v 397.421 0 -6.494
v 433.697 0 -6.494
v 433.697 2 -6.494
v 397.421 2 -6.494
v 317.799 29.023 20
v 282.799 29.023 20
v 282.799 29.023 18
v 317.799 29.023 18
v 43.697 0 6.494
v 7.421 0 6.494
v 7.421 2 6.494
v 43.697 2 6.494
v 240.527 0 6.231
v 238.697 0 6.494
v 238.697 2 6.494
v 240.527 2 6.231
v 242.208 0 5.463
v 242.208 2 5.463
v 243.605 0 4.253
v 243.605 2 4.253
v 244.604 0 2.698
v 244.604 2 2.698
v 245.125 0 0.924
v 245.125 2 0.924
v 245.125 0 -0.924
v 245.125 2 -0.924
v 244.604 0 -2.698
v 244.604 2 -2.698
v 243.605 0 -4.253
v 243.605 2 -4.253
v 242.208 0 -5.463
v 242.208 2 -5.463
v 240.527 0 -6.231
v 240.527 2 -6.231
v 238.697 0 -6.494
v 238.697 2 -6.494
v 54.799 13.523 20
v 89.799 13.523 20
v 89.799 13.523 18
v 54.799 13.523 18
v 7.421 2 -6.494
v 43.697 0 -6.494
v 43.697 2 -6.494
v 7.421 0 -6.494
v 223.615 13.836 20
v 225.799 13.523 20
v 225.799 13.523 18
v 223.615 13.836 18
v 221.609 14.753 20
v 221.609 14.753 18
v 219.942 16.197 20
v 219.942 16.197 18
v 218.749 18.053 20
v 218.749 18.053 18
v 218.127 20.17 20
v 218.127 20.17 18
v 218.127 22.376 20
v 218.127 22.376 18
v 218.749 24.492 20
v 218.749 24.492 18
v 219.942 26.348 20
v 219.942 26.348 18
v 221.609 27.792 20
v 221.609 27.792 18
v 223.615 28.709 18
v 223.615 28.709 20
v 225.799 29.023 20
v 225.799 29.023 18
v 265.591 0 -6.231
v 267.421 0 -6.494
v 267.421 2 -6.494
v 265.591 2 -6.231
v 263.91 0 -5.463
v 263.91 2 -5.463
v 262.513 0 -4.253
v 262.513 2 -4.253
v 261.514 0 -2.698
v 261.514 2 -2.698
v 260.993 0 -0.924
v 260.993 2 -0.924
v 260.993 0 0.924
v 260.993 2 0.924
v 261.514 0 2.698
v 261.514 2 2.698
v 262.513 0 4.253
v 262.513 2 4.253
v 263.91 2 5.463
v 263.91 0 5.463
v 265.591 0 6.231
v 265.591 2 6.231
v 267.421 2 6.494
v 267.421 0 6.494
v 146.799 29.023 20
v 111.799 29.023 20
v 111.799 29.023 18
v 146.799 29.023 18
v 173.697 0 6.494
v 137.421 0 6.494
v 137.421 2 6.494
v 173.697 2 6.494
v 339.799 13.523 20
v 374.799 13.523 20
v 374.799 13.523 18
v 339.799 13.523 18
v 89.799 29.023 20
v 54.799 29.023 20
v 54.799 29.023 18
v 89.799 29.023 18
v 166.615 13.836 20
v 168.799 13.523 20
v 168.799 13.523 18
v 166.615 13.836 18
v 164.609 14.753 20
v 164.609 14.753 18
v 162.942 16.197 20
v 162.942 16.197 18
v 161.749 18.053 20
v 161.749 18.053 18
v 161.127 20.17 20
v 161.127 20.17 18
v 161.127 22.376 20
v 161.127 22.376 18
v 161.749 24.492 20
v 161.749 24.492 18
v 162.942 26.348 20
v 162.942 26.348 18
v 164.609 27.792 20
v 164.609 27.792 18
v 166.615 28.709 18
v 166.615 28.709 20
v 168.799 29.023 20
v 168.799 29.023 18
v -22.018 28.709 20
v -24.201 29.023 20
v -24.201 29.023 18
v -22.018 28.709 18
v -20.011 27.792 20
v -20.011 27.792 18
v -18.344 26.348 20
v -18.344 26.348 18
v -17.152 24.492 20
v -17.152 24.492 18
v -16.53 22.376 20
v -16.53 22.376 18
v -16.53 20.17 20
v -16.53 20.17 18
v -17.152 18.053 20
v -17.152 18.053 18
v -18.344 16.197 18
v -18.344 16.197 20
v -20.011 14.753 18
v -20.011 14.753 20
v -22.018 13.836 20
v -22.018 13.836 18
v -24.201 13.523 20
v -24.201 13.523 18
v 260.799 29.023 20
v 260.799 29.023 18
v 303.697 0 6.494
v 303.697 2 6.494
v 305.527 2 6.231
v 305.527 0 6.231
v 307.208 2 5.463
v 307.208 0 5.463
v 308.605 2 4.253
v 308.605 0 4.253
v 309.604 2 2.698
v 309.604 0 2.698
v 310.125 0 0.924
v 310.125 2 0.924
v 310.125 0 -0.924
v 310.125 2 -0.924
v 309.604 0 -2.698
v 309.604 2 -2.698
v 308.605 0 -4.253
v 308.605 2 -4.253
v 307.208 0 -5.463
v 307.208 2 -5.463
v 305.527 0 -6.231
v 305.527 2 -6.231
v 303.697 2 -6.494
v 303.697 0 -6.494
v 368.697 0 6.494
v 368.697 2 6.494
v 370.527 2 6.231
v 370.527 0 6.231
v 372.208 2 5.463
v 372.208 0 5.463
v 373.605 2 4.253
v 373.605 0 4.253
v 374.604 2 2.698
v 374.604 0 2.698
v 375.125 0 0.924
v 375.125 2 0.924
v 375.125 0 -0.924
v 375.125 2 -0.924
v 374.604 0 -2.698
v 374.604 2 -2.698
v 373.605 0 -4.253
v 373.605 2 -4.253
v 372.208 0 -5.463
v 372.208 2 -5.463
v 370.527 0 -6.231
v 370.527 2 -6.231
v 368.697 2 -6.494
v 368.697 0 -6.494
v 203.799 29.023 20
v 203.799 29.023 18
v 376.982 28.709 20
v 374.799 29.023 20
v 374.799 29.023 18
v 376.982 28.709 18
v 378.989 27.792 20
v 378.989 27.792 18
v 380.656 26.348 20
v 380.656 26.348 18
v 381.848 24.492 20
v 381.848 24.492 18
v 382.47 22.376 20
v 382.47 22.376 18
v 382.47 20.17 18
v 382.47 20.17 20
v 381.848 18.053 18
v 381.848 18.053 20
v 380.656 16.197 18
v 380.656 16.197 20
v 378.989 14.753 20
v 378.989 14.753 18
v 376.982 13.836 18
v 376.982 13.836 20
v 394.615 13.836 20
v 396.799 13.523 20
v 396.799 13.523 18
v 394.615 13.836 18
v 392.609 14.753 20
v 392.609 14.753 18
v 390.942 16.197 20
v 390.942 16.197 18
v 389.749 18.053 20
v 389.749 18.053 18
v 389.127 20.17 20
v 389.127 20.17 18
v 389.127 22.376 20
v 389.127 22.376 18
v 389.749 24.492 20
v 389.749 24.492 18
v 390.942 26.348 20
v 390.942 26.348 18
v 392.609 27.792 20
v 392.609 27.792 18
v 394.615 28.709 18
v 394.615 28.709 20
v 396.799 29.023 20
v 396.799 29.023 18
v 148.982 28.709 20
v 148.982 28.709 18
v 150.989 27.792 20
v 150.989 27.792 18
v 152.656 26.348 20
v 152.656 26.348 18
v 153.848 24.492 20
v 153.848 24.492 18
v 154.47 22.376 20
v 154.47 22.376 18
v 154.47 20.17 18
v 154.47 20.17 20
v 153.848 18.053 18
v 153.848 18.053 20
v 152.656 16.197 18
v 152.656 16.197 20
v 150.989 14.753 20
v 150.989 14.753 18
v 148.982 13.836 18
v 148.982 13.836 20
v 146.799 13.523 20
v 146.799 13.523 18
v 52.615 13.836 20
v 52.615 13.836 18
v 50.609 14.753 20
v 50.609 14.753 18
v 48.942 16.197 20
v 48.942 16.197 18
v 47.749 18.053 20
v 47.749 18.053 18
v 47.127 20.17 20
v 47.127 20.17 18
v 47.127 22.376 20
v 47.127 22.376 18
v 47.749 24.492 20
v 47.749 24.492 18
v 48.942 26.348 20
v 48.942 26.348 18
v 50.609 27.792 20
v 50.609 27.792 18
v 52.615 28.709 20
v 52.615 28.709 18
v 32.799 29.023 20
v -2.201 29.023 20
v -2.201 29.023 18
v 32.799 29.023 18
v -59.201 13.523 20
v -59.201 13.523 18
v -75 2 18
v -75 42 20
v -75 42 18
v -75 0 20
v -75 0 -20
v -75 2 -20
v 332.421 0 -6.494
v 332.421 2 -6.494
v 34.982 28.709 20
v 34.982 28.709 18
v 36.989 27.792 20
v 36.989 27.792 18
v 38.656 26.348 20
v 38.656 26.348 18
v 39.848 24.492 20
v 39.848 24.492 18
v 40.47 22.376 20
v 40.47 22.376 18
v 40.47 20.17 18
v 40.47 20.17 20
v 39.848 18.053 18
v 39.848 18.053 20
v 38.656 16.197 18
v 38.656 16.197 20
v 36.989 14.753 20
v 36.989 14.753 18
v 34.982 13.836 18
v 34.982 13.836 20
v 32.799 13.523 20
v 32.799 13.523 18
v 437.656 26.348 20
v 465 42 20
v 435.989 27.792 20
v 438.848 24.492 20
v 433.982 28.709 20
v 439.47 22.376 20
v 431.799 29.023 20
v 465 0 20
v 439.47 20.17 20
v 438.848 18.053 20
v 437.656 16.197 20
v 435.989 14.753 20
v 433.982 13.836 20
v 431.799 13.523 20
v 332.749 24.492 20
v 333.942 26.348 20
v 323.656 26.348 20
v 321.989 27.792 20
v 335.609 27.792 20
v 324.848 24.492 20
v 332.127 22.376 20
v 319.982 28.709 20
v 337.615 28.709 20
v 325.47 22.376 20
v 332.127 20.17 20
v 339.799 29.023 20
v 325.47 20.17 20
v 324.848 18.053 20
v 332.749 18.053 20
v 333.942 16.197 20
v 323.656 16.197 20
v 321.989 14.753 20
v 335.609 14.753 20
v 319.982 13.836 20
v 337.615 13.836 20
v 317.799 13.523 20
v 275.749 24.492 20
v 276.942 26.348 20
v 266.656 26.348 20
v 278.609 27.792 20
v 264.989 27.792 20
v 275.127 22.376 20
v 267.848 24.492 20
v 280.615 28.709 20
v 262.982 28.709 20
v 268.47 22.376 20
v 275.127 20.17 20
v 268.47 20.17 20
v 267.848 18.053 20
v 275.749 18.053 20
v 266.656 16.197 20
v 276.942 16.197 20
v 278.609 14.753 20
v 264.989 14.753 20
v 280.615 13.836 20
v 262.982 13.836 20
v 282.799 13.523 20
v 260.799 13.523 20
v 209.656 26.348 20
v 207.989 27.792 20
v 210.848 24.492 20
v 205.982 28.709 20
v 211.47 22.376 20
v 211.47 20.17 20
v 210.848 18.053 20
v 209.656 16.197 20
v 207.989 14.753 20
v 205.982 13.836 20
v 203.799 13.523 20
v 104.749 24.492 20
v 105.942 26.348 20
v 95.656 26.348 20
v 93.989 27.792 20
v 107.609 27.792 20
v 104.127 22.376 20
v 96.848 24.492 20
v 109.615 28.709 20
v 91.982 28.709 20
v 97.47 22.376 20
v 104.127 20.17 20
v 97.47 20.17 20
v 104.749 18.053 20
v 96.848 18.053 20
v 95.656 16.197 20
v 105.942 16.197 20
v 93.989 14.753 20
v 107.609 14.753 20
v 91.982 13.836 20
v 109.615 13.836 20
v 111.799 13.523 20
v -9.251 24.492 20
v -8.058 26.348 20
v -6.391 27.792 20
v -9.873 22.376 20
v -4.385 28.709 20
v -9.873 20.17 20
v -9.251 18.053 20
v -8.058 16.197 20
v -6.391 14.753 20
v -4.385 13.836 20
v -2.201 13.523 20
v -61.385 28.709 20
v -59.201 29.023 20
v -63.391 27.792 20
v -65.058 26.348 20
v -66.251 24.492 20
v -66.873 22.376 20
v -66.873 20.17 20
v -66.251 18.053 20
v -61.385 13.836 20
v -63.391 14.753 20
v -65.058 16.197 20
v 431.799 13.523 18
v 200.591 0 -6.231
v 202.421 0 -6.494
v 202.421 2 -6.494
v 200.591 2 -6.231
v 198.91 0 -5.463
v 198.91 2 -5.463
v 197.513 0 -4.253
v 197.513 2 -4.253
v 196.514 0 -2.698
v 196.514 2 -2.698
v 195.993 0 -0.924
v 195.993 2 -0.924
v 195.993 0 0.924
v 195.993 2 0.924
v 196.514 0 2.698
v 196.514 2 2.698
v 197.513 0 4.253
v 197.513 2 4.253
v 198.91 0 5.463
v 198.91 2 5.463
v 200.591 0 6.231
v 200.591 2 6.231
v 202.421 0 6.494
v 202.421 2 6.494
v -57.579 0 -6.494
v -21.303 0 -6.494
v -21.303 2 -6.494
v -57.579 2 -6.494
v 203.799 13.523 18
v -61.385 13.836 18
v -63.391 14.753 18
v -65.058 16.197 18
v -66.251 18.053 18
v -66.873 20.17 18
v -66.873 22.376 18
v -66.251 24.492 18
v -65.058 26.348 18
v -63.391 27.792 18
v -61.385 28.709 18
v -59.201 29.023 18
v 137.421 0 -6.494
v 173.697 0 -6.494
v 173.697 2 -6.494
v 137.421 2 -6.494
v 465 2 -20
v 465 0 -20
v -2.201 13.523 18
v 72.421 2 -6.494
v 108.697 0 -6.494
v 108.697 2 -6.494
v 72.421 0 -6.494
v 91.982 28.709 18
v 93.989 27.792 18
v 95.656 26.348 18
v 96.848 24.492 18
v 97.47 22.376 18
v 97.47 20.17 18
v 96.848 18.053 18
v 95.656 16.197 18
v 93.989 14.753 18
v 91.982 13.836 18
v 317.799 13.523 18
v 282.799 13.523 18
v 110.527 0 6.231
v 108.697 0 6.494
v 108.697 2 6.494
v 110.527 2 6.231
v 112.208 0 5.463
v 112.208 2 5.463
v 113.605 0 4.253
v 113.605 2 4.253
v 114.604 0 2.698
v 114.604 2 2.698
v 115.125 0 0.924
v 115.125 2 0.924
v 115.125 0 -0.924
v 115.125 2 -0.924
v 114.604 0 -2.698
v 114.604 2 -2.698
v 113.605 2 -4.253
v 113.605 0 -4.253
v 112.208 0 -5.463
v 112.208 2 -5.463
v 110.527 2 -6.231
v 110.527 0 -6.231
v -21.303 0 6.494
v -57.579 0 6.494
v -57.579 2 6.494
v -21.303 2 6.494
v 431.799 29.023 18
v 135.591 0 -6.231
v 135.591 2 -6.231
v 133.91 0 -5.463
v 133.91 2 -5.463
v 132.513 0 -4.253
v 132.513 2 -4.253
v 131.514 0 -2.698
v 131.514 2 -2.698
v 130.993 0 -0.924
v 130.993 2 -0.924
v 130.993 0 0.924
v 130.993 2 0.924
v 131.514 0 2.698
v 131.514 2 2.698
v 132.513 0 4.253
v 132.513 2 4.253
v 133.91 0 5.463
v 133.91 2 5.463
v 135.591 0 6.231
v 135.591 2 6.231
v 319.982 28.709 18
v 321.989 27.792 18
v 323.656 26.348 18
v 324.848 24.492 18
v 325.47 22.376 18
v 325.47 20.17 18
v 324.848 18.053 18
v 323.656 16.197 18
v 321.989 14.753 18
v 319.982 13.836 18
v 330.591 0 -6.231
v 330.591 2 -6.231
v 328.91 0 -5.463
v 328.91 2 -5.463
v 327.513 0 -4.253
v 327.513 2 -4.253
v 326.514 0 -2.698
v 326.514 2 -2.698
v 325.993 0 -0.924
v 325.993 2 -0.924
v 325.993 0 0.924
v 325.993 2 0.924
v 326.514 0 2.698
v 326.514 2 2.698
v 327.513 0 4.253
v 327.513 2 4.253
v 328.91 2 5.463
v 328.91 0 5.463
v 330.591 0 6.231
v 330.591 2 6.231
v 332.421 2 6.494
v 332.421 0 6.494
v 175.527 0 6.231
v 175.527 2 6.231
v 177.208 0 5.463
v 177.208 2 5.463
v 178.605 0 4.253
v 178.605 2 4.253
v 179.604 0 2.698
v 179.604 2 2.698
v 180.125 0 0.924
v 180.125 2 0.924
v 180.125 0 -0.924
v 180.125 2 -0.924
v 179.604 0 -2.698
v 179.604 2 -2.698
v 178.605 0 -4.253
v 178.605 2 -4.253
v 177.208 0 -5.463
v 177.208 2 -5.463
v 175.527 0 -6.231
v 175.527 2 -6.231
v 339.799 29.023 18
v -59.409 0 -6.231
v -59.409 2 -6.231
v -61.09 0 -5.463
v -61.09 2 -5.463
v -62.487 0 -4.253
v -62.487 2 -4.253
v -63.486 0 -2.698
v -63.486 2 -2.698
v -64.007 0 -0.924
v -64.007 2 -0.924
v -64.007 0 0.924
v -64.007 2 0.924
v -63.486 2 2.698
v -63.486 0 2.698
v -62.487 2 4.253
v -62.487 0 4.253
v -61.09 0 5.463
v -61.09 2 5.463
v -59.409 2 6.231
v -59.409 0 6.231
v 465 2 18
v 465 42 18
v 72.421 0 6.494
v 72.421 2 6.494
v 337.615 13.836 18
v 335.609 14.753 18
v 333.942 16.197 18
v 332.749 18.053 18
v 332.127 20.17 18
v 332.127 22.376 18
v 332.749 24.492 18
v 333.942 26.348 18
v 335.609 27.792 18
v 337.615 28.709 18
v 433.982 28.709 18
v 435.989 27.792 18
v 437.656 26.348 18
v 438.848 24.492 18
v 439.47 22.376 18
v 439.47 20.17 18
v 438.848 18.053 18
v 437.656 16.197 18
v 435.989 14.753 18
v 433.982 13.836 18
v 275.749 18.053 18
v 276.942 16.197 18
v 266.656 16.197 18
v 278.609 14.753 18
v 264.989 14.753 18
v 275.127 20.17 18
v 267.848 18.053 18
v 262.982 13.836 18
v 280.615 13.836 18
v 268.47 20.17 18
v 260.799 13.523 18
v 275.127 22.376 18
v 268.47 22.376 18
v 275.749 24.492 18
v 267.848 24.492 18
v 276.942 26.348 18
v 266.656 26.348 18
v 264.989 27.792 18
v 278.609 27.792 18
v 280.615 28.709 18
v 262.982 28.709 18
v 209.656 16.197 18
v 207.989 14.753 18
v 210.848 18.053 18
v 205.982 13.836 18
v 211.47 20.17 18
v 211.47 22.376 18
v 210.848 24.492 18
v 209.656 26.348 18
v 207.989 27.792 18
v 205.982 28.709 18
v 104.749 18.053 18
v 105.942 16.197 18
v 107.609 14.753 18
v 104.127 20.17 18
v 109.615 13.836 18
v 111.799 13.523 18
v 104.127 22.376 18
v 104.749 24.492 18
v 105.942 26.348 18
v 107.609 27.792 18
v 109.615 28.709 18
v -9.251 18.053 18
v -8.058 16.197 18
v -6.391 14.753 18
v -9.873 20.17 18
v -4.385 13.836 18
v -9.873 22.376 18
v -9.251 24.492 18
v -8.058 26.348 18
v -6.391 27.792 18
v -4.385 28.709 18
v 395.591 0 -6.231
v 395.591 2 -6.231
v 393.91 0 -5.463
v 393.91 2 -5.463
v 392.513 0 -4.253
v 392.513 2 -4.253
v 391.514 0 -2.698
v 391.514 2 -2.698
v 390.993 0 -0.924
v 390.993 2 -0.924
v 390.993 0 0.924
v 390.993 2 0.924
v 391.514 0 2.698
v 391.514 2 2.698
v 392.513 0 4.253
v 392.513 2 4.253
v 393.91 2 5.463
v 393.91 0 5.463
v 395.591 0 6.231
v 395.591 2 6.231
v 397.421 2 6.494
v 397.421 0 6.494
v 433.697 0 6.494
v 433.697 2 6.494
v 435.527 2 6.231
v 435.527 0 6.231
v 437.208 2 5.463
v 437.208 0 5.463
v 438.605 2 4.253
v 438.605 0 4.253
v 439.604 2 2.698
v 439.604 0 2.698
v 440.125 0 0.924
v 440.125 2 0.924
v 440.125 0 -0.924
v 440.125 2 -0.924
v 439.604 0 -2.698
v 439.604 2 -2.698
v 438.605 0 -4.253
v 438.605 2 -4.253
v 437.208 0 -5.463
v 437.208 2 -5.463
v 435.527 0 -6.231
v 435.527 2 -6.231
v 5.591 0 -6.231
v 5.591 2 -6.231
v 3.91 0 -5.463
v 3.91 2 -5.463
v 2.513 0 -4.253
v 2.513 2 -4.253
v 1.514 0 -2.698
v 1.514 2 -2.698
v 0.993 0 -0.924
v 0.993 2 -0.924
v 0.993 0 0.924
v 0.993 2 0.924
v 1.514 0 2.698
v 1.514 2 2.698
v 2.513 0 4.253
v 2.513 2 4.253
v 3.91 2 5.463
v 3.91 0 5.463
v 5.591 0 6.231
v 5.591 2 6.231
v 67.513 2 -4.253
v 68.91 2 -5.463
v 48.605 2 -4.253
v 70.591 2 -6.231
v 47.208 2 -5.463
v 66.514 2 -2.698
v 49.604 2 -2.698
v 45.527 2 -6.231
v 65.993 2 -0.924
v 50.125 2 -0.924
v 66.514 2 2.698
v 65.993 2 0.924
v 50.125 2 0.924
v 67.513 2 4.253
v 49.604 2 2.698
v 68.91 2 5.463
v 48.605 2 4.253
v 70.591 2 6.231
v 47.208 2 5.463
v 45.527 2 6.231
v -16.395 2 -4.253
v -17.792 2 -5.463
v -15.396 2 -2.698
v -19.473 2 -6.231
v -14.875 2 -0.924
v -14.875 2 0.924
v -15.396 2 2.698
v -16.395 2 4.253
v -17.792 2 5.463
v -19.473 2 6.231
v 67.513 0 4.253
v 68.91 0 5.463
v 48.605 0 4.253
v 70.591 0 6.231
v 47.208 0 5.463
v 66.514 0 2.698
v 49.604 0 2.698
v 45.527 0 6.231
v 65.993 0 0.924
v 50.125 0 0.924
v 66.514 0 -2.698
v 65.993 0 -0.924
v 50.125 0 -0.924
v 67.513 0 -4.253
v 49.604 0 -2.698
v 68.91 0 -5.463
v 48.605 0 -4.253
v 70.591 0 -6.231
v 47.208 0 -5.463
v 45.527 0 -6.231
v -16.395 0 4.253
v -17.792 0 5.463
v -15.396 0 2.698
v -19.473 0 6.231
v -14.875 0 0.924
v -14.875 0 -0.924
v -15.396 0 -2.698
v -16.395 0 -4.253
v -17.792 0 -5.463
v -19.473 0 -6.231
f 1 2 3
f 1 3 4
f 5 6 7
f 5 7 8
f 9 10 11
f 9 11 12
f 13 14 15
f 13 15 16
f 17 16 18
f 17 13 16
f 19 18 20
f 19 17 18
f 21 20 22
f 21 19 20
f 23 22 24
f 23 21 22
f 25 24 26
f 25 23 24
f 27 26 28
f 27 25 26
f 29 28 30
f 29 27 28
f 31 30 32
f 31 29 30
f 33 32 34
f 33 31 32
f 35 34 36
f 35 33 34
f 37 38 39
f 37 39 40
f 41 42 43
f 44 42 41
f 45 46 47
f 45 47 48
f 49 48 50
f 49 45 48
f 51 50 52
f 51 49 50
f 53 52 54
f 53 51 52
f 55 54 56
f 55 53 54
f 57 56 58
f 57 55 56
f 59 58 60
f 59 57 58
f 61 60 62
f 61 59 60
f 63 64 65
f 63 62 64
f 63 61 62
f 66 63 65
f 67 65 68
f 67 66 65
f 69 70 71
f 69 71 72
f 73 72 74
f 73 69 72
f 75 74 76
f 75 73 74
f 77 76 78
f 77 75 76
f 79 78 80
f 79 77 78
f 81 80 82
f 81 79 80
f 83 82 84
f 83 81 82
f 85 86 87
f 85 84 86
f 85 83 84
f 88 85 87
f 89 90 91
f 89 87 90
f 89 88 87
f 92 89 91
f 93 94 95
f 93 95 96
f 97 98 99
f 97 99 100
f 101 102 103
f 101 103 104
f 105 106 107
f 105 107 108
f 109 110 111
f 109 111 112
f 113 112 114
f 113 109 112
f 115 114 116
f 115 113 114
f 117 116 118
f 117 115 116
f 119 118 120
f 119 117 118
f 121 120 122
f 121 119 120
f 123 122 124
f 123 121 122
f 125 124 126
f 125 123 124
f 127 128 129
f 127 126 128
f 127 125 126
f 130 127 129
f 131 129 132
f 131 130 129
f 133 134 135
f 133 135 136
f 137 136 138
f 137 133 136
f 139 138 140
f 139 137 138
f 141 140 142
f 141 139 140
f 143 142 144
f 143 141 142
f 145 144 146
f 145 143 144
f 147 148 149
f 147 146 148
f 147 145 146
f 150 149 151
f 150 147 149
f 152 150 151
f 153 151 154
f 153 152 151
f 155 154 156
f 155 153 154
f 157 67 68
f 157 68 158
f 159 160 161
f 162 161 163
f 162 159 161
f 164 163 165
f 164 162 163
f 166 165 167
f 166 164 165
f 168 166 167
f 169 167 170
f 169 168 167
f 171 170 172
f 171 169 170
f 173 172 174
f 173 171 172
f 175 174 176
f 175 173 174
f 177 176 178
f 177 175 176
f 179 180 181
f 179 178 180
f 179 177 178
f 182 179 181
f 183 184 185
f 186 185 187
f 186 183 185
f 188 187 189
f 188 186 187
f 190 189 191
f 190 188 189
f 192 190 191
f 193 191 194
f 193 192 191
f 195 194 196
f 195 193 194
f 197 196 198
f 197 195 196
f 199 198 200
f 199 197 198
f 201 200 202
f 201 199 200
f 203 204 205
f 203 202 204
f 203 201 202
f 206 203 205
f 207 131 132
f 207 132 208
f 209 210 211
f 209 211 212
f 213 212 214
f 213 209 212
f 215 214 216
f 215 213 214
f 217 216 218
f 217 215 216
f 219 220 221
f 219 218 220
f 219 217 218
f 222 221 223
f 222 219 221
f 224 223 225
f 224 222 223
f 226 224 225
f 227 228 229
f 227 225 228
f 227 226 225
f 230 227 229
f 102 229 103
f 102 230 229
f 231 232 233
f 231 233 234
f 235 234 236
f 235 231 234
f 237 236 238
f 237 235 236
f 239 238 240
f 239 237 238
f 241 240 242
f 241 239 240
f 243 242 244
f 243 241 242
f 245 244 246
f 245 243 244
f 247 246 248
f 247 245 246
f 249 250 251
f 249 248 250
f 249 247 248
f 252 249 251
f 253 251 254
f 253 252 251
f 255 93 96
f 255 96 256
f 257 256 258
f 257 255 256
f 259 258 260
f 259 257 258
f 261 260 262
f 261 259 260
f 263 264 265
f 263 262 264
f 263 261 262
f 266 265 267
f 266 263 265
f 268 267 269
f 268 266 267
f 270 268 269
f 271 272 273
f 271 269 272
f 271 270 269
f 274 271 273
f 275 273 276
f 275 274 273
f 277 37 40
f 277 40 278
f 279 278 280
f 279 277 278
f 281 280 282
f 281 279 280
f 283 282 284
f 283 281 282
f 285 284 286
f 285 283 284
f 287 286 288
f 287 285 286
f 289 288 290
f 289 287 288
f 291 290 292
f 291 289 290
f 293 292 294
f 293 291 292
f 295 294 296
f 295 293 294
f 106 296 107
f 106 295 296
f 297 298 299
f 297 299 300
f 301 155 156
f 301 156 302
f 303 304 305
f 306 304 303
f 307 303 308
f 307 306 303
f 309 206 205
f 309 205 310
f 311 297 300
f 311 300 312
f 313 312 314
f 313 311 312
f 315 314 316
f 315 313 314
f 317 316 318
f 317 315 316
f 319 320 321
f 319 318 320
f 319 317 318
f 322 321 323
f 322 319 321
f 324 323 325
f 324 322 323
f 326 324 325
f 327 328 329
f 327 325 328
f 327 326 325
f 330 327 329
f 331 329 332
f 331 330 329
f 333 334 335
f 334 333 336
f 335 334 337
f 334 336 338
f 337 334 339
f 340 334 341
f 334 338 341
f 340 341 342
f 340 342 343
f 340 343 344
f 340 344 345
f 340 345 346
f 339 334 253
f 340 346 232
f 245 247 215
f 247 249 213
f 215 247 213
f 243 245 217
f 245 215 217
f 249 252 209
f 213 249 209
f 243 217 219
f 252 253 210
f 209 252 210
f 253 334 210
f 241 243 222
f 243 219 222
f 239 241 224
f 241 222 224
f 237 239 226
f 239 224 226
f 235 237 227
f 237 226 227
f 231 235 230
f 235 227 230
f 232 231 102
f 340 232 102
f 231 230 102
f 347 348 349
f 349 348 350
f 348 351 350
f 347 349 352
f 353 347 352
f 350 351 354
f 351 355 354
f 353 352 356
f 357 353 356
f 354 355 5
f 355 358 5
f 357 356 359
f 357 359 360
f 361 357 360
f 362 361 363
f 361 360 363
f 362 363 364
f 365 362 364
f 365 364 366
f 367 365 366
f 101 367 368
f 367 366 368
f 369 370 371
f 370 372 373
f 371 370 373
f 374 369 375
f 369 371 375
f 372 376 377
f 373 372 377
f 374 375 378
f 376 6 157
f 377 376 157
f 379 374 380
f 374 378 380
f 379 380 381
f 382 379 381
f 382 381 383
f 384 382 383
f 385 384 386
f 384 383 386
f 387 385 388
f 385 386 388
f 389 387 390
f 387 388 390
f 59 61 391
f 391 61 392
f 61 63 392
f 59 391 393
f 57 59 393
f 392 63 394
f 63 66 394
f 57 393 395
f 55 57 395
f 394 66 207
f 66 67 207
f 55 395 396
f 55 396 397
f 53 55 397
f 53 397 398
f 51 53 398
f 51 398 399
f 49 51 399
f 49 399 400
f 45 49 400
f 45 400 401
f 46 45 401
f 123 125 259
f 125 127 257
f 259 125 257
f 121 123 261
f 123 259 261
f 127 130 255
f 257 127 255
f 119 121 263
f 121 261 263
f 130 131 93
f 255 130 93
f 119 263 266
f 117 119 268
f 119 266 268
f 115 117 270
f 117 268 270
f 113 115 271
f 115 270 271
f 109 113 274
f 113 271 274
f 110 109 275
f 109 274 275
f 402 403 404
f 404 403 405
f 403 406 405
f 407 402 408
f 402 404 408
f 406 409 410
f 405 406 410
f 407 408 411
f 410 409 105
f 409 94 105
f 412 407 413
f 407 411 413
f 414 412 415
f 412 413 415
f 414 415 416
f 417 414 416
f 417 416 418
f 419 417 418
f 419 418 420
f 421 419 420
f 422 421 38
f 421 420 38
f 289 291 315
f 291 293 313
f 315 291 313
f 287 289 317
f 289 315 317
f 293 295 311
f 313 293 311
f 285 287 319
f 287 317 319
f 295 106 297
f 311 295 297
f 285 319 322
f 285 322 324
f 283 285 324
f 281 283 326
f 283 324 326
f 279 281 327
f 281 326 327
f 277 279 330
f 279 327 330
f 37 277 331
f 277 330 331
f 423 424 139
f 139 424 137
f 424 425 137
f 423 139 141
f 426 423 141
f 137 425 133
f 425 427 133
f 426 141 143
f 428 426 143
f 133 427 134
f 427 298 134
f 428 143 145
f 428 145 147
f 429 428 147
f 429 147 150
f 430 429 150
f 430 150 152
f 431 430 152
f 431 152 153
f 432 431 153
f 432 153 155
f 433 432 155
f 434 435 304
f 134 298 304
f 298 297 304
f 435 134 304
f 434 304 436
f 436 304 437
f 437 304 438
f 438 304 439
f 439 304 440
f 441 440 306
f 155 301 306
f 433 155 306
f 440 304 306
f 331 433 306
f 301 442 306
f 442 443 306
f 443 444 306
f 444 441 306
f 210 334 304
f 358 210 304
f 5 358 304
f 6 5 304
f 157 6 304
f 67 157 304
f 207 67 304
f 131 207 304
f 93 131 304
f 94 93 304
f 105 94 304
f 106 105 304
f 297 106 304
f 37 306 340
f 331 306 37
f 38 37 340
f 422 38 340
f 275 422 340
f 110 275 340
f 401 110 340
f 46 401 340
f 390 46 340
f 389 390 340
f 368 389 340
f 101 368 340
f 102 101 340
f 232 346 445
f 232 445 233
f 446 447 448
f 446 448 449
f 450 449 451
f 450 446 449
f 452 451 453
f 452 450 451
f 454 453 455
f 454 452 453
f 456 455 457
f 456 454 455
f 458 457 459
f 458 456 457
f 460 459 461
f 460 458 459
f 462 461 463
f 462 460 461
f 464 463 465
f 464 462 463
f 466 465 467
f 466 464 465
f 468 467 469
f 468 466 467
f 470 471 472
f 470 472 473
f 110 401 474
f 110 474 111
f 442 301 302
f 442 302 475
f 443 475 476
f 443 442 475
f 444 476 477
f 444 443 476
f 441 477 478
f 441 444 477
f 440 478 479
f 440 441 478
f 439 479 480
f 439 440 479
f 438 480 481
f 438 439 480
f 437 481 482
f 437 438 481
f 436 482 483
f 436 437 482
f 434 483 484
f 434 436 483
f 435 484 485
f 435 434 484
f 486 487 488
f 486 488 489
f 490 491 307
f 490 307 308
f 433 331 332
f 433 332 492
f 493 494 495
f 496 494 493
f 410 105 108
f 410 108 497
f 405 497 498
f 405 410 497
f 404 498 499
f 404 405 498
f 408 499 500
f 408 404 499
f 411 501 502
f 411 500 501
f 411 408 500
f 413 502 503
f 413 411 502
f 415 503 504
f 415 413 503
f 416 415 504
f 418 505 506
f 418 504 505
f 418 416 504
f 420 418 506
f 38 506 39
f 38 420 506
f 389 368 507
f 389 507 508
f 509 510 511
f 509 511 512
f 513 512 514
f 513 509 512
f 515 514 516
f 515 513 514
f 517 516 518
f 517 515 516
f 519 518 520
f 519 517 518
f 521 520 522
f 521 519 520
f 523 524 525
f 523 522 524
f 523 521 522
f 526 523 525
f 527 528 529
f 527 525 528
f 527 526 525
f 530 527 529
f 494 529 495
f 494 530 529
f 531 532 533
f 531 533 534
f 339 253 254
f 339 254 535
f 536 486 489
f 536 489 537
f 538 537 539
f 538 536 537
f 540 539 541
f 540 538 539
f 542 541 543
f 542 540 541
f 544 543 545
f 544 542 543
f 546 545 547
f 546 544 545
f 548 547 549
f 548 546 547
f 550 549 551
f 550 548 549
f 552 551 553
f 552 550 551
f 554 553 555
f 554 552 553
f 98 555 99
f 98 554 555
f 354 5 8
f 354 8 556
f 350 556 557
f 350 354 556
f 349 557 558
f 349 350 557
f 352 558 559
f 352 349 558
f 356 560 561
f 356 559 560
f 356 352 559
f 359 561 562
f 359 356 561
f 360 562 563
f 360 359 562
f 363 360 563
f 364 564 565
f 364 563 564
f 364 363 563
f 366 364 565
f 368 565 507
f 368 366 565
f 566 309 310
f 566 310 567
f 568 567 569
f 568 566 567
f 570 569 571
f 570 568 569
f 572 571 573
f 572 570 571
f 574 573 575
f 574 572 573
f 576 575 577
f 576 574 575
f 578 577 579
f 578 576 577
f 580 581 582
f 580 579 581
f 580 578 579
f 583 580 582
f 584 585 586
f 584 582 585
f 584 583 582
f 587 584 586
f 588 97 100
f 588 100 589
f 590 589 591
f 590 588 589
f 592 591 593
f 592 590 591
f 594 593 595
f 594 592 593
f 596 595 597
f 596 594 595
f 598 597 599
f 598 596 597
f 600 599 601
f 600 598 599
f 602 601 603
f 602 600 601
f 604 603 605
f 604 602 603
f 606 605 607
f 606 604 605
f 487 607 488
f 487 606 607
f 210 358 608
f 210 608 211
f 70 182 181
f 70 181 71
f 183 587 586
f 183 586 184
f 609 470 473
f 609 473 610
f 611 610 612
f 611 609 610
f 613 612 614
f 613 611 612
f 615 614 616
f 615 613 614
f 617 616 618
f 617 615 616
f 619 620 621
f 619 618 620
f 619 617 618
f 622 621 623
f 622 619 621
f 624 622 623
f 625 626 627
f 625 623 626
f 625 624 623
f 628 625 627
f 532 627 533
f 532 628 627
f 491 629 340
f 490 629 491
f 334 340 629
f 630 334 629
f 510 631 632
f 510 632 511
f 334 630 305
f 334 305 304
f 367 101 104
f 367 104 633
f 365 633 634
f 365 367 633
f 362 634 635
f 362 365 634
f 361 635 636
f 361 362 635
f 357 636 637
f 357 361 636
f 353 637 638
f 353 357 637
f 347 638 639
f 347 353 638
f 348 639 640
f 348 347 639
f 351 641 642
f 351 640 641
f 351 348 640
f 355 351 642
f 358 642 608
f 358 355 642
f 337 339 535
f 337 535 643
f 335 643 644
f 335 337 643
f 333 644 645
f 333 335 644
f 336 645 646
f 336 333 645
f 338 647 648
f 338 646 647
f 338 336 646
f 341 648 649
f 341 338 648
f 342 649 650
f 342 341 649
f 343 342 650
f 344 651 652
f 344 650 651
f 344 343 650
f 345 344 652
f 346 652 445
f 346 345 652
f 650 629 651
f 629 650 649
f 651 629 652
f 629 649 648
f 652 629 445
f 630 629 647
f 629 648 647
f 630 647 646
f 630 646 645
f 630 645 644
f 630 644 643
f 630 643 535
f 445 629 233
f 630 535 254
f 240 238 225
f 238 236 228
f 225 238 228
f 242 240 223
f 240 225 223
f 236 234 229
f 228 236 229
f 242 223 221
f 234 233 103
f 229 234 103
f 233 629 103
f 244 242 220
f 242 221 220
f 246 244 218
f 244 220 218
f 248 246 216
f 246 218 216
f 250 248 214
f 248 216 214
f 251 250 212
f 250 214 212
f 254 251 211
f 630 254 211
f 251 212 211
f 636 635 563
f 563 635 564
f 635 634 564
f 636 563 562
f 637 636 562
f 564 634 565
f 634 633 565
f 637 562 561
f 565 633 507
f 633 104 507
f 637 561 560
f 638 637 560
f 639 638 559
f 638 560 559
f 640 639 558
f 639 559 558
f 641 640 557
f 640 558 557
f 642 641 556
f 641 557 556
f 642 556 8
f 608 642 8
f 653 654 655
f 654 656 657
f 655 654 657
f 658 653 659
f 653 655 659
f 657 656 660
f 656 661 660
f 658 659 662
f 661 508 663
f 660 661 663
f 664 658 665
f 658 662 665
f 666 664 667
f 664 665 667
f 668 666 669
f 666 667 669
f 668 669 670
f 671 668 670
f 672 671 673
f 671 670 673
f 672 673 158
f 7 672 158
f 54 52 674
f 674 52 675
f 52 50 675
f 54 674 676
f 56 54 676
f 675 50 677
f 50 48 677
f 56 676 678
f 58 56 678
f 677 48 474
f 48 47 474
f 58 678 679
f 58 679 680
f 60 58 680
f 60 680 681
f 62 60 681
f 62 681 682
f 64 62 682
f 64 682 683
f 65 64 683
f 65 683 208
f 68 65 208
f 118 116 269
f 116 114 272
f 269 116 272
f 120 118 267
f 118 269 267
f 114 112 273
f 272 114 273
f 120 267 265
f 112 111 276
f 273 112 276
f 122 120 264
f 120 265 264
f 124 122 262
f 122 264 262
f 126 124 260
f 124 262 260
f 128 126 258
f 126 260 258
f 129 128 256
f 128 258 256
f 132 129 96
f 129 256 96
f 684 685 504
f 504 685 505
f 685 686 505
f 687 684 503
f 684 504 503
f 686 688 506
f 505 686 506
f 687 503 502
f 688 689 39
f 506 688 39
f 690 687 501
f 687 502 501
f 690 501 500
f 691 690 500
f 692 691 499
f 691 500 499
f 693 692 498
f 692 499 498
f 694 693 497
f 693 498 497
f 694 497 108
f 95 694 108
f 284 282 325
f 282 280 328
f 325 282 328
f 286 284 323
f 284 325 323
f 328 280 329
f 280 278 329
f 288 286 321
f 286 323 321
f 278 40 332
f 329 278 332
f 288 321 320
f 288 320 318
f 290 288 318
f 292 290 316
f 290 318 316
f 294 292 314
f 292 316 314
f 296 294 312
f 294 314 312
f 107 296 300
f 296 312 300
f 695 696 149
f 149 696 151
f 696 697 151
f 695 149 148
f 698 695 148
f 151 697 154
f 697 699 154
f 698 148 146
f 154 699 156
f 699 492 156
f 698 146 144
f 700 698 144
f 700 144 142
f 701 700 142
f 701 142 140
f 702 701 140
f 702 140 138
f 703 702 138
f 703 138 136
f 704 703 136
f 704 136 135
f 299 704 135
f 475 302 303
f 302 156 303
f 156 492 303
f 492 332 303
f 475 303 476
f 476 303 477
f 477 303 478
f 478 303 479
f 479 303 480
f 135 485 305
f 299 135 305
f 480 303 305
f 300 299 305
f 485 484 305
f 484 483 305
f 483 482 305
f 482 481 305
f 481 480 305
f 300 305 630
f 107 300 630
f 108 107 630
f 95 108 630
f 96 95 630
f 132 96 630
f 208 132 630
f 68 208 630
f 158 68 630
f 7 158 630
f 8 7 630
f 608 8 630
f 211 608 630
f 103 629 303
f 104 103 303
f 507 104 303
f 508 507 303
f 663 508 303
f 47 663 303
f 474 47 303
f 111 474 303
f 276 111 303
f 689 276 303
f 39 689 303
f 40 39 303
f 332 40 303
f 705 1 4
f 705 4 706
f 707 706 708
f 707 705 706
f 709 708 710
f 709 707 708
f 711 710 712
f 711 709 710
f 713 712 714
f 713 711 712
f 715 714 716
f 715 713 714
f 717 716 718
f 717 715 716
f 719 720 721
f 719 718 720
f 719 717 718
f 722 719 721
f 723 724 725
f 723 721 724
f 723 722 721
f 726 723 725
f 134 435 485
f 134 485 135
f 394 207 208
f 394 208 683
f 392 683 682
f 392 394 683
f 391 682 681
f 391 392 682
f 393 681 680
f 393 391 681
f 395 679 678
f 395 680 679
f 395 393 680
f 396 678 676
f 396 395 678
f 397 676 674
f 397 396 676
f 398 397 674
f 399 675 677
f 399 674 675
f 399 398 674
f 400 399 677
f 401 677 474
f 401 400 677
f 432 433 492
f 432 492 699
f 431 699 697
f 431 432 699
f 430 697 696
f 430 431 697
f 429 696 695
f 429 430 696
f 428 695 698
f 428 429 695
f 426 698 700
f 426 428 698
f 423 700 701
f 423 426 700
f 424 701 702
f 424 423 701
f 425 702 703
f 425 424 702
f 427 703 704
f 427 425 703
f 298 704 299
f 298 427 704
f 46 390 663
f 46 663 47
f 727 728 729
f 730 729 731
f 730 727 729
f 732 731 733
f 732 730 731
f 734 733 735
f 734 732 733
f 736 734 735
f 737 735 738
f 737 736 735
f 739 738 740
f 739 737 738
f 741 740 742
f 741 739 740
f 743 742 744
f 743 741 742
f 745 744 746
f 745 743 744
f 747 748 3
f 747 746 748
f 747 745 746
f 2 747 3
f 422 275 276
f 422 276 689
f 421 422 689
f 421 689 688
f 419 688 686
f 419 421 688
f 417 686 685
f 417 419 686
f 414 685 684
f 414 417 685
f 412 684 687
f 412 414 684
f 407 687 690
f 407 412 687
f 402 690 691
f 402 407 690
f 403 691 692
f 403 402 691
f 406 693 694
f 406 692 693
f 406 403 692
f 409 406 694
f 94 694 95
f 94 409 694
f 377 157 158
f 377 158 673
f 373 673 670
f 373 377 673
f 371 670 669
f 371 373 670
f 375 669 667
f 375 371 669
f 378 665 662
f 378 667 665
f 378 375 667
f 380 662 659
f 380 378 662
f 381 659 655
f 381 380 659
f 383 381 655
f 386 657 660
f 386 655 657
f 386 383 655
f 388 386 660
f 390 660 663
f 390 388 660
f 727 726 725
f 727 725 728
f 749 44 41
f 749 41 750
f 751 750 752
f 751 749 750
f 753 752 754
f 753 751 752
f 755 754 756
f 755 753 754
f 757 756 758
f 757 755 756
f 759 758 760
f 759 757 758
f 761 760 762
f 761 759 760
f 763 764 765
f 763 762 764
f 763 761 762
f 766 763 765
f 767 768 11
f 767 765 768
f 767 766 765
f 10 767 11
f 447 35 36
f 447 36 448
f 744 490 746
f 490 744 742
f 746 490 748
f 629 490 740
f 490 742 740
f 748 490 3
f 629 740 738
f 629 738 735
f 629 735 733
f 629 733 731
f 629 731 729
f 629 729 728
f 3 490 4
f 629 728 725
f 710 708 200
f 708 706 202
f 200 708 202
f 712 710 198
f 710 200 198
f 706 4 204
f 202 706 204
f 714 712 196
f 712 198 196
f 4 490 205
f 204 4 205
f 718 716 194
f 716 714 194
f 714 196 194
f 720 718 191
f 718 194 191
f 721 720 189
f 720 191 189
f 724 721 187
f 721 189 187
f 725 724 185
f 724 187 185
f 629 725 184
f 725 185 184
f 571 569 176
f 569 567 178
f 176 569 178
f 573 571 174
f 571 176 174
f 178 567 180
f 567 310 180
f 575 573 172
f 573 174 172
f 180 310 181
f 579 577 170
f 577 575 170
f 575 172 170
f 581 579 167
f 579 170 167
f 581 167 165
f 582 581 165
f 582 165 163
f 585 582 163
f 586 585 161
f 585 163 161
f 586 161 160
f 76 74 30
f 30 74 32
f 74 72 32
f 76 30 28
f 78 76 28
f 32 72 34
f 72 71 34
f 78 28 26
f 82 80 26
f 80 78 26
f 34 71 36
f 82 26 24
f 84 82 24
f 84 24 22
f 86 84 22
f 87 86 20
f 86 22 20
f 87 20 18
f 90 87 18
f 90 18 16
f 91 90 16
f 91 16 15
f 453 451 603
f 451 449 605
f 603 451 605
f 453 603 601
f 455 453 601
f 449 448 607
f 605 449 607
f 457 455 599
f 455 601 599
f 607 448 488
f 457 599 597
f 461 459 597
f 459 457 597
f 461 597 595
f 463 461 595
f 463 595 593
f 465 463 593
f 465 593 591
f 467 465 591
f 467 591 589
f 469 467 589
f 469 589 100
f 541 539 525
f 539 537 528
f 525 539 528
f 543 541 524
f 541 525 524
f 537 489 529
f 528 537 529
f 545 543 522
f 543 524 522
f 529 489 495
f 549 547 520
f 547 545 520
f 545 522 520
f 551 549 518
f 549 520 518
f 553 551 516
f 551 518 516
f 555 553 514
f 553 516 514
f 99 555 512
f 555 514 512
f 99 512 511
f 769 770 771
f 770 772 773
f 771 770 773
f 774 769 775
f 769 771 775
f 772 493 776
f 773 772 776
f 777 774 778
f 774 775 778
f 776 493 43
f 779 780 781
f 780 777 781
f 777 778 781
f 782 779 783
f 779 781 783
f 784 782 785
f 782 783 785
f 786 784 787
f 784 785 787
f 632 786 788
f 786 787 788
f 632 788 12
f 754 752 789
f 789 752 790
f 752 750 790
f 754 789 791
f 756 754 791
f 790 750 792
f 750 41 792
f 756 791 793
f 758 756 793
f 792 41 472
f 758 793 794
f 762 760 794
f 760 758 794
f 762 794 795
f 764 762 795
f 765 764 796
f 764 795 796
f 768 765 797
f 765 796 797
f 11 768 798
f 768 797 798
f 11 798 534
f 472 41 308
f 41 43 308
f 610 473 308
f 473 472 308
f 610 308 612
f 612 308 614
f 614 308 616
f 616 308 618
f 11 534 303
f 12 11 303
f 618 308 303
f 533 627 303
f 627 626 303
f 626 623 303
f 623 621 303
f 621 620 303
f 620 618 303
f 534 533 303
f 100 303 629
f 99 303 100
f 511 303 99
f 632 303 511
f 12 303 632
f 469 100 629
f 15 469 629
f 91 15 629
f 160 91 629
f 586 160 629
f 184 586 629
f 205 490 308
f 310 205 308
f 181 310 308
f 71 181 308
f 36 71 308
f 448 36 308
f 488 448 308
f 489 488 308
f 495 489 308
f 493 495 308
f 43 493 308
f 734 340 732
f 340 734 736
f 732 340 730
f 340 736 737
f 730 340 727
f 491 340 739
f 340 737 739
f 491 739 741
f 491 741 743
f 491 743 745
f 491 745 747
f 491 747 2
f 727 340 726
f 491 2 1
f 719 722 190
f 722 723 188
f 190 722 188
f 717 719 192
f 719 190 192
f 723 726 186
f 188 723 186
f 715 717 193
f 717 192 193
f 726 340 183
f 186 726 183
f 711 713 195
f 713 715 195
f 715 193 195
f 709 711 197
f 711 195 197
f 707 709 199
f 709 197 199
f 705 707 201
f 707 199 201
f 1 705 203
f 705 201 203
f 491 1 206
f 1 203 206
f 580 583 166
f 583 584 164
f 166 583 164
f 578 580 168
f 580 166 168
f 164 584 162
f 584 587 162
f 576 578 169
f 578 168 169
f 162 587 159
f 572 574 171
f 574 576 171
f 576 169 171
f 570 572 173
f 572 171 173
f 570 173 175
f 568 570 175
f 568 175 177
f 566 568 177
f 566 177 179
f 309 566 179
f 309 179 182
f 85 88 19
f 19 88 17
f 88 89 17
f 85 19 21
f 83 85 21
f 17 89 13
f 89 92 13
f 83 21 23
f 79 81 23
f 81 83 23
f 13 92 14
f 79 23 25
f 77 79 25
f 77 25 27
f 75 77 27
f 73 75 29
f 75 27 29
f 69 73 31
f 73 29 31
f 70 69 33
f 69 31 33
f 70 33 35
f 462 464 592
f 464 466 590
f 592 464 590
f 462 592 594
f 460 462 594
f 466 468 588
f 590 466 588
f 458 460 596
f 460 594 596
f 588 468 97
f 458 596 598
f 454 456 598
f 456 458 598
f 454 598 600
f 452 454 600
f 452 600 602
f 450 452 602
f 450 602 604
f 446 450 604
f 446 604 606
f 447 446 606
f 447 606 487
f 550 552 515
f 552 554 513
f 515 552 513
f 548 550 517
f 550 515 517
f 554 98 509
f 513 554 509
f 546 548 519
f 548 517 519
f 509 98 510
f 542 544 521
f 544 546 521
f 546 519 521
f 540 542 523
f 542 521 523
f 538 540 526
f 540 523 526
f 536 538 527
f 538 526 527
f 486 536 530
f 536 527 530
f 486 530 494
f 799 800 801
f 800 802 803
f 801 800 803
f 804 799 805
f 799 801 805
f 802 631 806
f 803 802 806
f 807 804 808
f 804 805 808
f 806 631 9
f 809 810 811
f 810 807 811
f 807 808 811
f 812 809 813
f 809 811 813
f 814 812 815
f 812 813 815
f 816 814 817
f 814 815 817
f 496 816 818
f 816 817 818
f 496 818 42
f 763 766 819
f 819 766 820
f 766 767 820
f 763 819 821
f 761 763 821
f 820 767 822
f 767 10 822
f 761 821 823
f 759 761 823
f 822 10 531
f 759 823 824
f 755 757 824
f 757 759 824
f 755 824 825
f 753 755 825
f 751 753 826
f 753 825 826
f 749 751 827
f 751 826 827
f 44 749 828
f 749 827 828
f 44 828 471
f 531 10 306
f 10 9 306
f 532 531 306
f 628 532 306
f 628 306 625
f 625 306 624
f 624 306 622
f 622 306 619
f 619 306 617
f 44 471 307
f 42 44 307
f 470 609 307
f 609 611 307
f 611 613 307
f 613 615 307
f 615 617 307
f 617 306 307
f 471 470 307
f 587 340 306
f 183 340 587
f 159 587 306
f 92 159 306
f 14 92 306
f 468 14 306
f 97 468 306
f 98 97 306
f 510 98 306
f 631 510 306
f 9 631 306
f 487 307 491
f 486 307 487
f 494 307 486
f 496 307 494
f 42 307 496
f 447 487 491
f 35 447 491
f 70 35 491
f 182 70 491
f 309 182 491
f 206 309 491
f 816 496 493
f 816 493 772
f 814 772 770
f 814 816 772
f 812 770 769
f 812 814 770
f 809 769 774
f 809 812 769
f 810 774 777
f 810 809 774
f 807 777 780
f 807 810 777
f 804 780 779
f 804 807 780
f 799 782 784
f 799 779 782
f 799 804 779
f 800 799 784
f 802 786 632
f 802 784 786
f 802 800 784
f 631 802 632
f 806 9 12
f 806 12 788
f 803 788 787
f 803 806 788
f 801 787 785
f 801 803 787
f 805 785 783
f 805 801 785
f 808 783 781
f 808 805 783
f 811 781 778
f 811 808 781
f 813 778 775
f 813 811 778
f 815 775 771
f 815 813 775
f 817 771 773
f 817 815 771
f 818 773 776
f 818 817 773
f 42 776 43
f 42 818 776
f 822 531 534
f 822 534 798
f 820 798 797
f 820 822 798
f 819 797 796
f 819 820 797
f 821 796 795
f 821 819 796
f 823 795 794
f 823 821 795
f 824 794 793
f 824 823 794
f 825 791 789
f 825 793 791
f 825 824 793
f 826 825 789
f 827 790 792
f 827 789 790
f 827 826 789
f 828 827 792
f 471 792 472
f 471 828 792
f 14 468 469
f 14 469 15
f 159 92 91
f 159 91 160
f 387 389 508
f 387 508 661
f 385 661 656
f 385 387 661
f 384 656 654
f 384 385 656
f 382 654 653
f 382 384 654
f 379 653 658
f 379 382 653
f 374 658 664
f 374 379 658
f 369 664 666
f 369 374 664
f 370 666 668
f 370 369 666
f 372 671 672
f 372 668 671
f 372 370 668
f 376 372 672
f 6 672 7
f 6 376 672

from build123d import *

# Parameters (mm, degrees)
SKETCH1_W           = 150
SKETCH1_H           = 40
BOSS_EXTRUDE1_DEPTH = 2
SKETCH2_W           = 150
SKETCH2_H           = 2
BOSS_EXTRUDE2_DEPTH = 40
BOSS_EXTRUDE3_DEPTH = 390
CUT_EXTRUDE1_DEPTH  = 10
CUT_EXTRUDE2_DEPTH  = 10


with BuildPart() as part:
    # Sketch1 → Boss-Extrude1 (new body)
    with BuildSketch(Plane(origin=(0, 0, 0), x_dir=(1, 0, 0), z_dir=(0, 1, 0))):
        Rectangle(SKETCH1_W, SKETCH1_H)
    extrude(amount=BOSS_EXTRUDE1_DEPTH)

    # Sketch2 → Boss-Extrude2 (add)
    with BuildSketch(Plane(origin=(0, 2, 0), x_dir=(1, 0, 0), z_dir=(0, 1, 0))):
        with Locations((0, -19)):
            Rectangle(SKETCH2_W, SKETCH2_H)
    extrude(amount=BOSS_EXTRUDE2_DEPTH)

    # Sketch5 → Boss-Extrude3 (add)
    with BuildSketch(Plane(origin=(75, 0, 0), x_dir=(0, 0, -1), z_dir=(1, 0, 0))):
        Polygon((-20, 0), (20, 0), (20, 2), (-18, 2), (-18, 42), (-20, 42), align=None)
    extrude(amount=BOSS_EXTRUDE3_DEPTH)

    # Sketch6 → Cut-Extrude1 (cut)
    with BuildSketch(Plane.XZ):
        with BuildLine():
            Line((7.420621343, 6.493750786), (43.697093864, 6.493750786))
            ThreePointArc((43.697093864, 6.493750786), (50.190844651, 0), (43.697093864, -6.493750786))
            Line((43.697093864, -6.493750786), (7.420621343, -6.493750786))
            ThreePointArc((7.420621343, -6.493750786), (0.926870557, 0), (7.420621343, 6.493750786))
        make_face()
        with BuildLine():
            Line((-57.579378657, 6.493750786), (-21.302906136, 6.493750786))
            ThreePointArc((-21.302906136, 6.493750786), (-14.809155349, 0), (-21.302906136, -6.493750786))
            Line((-21.302906136, -6.493750786), (-57.579378657, -6.493750786))
            ThreePointArc((-57.579378657, -6.493750786), (-64.073129443, 0), (-57.579378657, 6.493750786))
        make_face()
        with BuildLine():
            Line((72.420621343, 6.493750786), (108.697093864, 6.493750786))
            ThreePointArc((108.697093864, 6.493750786), (115.190844651, 0), (108.697093864, -6.493750786))
            Line((108.697093864, -6.493750786), (72.420621343, -6.493750786))
            ThreePointArc((72.420621343, -6.493750786), (65.926870557, 0), (72.420621343, 6.493750786))
        make_face()
        with BuildLine():
            Line((137.420621343, 6.493750786), (173.697093864, 6.493750786))
            ThreePointArc((173.697093864, 6.493750786), (180.190844651, 0), (173.697093864, -6.493750786))
            Line((173.697093864, -6.493750786), (137.420621343, -6.493750786))
            ThreePointArc((137.420621343, -6.493750786), (130.926870557, 0), (137.420621343, 6.493750786))
        make_face()
        with BuildLine():
            Line((202.420621343, 6.493750786), (238.697093864, 6.493750786))
            ThreePointArc((238.697093864, 6.493750786), (245.190844651, 0), (238.697093864, -6.493750786))
            Line((238.697093864, -6.493750786), (202.420621343, -6.493750786))
            ThreePointArc((202.420621343, -6.493750786), (195.926870557, 0), (202.420621343, 6.493750786))
        make_face()
        with BuildLine():
            Line((267.420621343, 6.493750786), (303.697093864, 6.493750786))
            ThreePointArc((303.697093864, 6.493750786), (310.190844651, 0), (303.697093864, -6.493750786))
            Line((303.697093864, -6.493750786), (267.420621343, -6.493750786))
            ThreePointArc((267.420621343, -6.493750786), (260.926870557, 0), (267.420621343, 6.493750786))
        make_face()
        with BuildLine():
            Line((332.420621343, 6.493750786), (368.697093864, 6.493750786))
            ThreePointArc((368.697093864, 6.493750786), (375.190844651, 0), (368.697093864, -6.493750786))
            Line((368.697093864, -6.493750786), (332.420621343, -6.493750786))
            ThreePointArc((332.420621343, -6.493750786), (325.926870557, 0), (332.420621343, 6.493750786))
        make_face()
        with BuildLine():
            Line((397.420621343, 6.493750786), (433.697093864, 6.493750786))
            ThreePointArc((433.697093864, 6.493750786), (440.190844651, 0), (433.697093864, -6.493750786))
            Line((433.697093864, -6.493750786), (397.420621343, -6.493750786))
            ThreePointArc((397.420621343, -6.493750786), (390.926870557, 0), (397.420621343, 6.493750786))
        make_face()
    extrude(amount=-CUT_EXTRUDE1_DEPTH, mode=Mode.SUBTRACT)

    # Sketch7 → Cut-Extrude2 (cut)
    with BuildSketch(Plane.XY.offset(20)):
        with BuildLine():
            Line((-2.201358411, 29.022590271), (32.798641589, 29.022590271))
            ThreePointArc((32.798641589, 29.022590271), (40.548675365, 21.272556495), (32.798641589, 13.522522718))
            Line((32.798641589, 13.522522718), (-2.201358411, 13.522522718))
            ThreePointArc((-2.201358411, 13.522522718), (-9.951392188, 21.272556495), (-2.201358411, 29.022590271))
        make_face()
        with BuildLine():
            Line((-59.201358411, 29.022590271), (-24.201358411, 29.022590271))
            ThreePointArc((-24.201358411, 29.022590271), (-16.451324635, 21.272556495), (-24.201358411, 13.522522718))
            Line((-24.201358411, 13.522522718), (-59.201358411, 13.522522718))
            ThreePointArc((-59.201358411, 13.522522718), (-66.951392188, 21.272556495), (-59.201358411, 29.022590271))
        make_face()
        with BuildLine():
            Line((54.798641589, 29.022590271), (89.798641589, 29.022590271))
            ThreePointArc((89.798641589, 29.022590271), (97.548675365, 21.272556495), (89.798641589, 13.522522718))
            Line((89.798641589, 13.522522718), (54.798641589, 13.522522718))
            ThreePointArc((54.798641589, 13.522522718), (47.048607812, 21.272556495), (54.798641589, 29.022590271))
        make_face()
        with BuildLine():
            Line((111.798641589, 29.022590271), (146.798641589, 29.022590271))
            ThreePointArc((146.798641589, 29.022590271), (154.548675365, 21.272556495), (146.798641589, 13.522522718))
            Line((146.798641589, 13.522522718), (111.798641589, 13.522522718))
            ThreePointArc((111.798641589, 13.522522718), (104.048607812, 21.272556495), (111.798641589, 29.022590271))
        make_face()
        with BuildLine():
            Line((168.798641589, 29.022590271), (203.798641589, 29.022590271))
            ThreePointArc((203.798641589, 29.022590271), (211.548675365, 21.272556495), (203.798641589, 13.522522718))
            Line((203.798641589, 13.522522718), (168.798641589, 13.522522718))
            ThreePointArc((168.798641589, 13.522522718), (161.048607812, 21.272556495), (168.798641589, 29.022590271))
        make_face()
        with BuildLine():
            Line((225.798641589, 29.022590271), (260.798641589, 29.022590271))
            ThreePointArc((260.798641589, 29.022590271), (268.548675365, 21.272556495), (260.798641589, 13.522522718))
            Line((260.798641589, 13.522522718), (225.798641589, 13.522522718))
            ThreePointArc((225.798641589, 13.522522718), (218.048607812, 21.272556495), (225.798641589, 29.022590271))
        make_face()
        with BuildLine():
            Line((282.798641589, 29.022590271), (317.798641589, 29.022590271))
            ThreePointArc((317.798641589, 29.022590271), (325.548675365, 21.272556495), (317.798641589, 13.522522718))
            Line((317.798641589, 13.522522718), (282.798641589, 13.522522718))
            ThreePointArc((282.798641589, 13.522522718), (275.048607812, 21.272556495), (282.798641589, 29.022590271))
        make_face()
        with BuildLine():
            Line((339.798641589, 29.022590271), (374.798641589, 29.022590271))
            ThreePointArc((374.798641589, 29.022590271), (382.548675365, 21.272556495), (374.798641589, 13.522522718))
            Line((374.798641589, 13.522522718), (339.798641589, 13.522522718))
            ThreePointArc((339.798641589, 13.522522718), (332.048607812, 21.272556495), (339.798641589, 29.022590271))
        make_face()
        with BuildLine():
            Line((396.798641589, 29.022590271), (431.798641589, 29.022590271))
            ThreePointArc((431.798641589, 29.022590271), (439.548675365, 21.272556495), (431.798641589, 13.522522718))
            Line((431.798641589, 13.522522718), (396.798641589, 13.522522718))
            ThreePointArc((396.798641589, 13.522522718), (389.048607812, 21.272556495), (396.798641589, 29.022590271))
        make_face()
    extrude(amount=-CUT_EXTRUDE2_DEPTH, mode=Mode.SUBTRACT)


solid = part.part
